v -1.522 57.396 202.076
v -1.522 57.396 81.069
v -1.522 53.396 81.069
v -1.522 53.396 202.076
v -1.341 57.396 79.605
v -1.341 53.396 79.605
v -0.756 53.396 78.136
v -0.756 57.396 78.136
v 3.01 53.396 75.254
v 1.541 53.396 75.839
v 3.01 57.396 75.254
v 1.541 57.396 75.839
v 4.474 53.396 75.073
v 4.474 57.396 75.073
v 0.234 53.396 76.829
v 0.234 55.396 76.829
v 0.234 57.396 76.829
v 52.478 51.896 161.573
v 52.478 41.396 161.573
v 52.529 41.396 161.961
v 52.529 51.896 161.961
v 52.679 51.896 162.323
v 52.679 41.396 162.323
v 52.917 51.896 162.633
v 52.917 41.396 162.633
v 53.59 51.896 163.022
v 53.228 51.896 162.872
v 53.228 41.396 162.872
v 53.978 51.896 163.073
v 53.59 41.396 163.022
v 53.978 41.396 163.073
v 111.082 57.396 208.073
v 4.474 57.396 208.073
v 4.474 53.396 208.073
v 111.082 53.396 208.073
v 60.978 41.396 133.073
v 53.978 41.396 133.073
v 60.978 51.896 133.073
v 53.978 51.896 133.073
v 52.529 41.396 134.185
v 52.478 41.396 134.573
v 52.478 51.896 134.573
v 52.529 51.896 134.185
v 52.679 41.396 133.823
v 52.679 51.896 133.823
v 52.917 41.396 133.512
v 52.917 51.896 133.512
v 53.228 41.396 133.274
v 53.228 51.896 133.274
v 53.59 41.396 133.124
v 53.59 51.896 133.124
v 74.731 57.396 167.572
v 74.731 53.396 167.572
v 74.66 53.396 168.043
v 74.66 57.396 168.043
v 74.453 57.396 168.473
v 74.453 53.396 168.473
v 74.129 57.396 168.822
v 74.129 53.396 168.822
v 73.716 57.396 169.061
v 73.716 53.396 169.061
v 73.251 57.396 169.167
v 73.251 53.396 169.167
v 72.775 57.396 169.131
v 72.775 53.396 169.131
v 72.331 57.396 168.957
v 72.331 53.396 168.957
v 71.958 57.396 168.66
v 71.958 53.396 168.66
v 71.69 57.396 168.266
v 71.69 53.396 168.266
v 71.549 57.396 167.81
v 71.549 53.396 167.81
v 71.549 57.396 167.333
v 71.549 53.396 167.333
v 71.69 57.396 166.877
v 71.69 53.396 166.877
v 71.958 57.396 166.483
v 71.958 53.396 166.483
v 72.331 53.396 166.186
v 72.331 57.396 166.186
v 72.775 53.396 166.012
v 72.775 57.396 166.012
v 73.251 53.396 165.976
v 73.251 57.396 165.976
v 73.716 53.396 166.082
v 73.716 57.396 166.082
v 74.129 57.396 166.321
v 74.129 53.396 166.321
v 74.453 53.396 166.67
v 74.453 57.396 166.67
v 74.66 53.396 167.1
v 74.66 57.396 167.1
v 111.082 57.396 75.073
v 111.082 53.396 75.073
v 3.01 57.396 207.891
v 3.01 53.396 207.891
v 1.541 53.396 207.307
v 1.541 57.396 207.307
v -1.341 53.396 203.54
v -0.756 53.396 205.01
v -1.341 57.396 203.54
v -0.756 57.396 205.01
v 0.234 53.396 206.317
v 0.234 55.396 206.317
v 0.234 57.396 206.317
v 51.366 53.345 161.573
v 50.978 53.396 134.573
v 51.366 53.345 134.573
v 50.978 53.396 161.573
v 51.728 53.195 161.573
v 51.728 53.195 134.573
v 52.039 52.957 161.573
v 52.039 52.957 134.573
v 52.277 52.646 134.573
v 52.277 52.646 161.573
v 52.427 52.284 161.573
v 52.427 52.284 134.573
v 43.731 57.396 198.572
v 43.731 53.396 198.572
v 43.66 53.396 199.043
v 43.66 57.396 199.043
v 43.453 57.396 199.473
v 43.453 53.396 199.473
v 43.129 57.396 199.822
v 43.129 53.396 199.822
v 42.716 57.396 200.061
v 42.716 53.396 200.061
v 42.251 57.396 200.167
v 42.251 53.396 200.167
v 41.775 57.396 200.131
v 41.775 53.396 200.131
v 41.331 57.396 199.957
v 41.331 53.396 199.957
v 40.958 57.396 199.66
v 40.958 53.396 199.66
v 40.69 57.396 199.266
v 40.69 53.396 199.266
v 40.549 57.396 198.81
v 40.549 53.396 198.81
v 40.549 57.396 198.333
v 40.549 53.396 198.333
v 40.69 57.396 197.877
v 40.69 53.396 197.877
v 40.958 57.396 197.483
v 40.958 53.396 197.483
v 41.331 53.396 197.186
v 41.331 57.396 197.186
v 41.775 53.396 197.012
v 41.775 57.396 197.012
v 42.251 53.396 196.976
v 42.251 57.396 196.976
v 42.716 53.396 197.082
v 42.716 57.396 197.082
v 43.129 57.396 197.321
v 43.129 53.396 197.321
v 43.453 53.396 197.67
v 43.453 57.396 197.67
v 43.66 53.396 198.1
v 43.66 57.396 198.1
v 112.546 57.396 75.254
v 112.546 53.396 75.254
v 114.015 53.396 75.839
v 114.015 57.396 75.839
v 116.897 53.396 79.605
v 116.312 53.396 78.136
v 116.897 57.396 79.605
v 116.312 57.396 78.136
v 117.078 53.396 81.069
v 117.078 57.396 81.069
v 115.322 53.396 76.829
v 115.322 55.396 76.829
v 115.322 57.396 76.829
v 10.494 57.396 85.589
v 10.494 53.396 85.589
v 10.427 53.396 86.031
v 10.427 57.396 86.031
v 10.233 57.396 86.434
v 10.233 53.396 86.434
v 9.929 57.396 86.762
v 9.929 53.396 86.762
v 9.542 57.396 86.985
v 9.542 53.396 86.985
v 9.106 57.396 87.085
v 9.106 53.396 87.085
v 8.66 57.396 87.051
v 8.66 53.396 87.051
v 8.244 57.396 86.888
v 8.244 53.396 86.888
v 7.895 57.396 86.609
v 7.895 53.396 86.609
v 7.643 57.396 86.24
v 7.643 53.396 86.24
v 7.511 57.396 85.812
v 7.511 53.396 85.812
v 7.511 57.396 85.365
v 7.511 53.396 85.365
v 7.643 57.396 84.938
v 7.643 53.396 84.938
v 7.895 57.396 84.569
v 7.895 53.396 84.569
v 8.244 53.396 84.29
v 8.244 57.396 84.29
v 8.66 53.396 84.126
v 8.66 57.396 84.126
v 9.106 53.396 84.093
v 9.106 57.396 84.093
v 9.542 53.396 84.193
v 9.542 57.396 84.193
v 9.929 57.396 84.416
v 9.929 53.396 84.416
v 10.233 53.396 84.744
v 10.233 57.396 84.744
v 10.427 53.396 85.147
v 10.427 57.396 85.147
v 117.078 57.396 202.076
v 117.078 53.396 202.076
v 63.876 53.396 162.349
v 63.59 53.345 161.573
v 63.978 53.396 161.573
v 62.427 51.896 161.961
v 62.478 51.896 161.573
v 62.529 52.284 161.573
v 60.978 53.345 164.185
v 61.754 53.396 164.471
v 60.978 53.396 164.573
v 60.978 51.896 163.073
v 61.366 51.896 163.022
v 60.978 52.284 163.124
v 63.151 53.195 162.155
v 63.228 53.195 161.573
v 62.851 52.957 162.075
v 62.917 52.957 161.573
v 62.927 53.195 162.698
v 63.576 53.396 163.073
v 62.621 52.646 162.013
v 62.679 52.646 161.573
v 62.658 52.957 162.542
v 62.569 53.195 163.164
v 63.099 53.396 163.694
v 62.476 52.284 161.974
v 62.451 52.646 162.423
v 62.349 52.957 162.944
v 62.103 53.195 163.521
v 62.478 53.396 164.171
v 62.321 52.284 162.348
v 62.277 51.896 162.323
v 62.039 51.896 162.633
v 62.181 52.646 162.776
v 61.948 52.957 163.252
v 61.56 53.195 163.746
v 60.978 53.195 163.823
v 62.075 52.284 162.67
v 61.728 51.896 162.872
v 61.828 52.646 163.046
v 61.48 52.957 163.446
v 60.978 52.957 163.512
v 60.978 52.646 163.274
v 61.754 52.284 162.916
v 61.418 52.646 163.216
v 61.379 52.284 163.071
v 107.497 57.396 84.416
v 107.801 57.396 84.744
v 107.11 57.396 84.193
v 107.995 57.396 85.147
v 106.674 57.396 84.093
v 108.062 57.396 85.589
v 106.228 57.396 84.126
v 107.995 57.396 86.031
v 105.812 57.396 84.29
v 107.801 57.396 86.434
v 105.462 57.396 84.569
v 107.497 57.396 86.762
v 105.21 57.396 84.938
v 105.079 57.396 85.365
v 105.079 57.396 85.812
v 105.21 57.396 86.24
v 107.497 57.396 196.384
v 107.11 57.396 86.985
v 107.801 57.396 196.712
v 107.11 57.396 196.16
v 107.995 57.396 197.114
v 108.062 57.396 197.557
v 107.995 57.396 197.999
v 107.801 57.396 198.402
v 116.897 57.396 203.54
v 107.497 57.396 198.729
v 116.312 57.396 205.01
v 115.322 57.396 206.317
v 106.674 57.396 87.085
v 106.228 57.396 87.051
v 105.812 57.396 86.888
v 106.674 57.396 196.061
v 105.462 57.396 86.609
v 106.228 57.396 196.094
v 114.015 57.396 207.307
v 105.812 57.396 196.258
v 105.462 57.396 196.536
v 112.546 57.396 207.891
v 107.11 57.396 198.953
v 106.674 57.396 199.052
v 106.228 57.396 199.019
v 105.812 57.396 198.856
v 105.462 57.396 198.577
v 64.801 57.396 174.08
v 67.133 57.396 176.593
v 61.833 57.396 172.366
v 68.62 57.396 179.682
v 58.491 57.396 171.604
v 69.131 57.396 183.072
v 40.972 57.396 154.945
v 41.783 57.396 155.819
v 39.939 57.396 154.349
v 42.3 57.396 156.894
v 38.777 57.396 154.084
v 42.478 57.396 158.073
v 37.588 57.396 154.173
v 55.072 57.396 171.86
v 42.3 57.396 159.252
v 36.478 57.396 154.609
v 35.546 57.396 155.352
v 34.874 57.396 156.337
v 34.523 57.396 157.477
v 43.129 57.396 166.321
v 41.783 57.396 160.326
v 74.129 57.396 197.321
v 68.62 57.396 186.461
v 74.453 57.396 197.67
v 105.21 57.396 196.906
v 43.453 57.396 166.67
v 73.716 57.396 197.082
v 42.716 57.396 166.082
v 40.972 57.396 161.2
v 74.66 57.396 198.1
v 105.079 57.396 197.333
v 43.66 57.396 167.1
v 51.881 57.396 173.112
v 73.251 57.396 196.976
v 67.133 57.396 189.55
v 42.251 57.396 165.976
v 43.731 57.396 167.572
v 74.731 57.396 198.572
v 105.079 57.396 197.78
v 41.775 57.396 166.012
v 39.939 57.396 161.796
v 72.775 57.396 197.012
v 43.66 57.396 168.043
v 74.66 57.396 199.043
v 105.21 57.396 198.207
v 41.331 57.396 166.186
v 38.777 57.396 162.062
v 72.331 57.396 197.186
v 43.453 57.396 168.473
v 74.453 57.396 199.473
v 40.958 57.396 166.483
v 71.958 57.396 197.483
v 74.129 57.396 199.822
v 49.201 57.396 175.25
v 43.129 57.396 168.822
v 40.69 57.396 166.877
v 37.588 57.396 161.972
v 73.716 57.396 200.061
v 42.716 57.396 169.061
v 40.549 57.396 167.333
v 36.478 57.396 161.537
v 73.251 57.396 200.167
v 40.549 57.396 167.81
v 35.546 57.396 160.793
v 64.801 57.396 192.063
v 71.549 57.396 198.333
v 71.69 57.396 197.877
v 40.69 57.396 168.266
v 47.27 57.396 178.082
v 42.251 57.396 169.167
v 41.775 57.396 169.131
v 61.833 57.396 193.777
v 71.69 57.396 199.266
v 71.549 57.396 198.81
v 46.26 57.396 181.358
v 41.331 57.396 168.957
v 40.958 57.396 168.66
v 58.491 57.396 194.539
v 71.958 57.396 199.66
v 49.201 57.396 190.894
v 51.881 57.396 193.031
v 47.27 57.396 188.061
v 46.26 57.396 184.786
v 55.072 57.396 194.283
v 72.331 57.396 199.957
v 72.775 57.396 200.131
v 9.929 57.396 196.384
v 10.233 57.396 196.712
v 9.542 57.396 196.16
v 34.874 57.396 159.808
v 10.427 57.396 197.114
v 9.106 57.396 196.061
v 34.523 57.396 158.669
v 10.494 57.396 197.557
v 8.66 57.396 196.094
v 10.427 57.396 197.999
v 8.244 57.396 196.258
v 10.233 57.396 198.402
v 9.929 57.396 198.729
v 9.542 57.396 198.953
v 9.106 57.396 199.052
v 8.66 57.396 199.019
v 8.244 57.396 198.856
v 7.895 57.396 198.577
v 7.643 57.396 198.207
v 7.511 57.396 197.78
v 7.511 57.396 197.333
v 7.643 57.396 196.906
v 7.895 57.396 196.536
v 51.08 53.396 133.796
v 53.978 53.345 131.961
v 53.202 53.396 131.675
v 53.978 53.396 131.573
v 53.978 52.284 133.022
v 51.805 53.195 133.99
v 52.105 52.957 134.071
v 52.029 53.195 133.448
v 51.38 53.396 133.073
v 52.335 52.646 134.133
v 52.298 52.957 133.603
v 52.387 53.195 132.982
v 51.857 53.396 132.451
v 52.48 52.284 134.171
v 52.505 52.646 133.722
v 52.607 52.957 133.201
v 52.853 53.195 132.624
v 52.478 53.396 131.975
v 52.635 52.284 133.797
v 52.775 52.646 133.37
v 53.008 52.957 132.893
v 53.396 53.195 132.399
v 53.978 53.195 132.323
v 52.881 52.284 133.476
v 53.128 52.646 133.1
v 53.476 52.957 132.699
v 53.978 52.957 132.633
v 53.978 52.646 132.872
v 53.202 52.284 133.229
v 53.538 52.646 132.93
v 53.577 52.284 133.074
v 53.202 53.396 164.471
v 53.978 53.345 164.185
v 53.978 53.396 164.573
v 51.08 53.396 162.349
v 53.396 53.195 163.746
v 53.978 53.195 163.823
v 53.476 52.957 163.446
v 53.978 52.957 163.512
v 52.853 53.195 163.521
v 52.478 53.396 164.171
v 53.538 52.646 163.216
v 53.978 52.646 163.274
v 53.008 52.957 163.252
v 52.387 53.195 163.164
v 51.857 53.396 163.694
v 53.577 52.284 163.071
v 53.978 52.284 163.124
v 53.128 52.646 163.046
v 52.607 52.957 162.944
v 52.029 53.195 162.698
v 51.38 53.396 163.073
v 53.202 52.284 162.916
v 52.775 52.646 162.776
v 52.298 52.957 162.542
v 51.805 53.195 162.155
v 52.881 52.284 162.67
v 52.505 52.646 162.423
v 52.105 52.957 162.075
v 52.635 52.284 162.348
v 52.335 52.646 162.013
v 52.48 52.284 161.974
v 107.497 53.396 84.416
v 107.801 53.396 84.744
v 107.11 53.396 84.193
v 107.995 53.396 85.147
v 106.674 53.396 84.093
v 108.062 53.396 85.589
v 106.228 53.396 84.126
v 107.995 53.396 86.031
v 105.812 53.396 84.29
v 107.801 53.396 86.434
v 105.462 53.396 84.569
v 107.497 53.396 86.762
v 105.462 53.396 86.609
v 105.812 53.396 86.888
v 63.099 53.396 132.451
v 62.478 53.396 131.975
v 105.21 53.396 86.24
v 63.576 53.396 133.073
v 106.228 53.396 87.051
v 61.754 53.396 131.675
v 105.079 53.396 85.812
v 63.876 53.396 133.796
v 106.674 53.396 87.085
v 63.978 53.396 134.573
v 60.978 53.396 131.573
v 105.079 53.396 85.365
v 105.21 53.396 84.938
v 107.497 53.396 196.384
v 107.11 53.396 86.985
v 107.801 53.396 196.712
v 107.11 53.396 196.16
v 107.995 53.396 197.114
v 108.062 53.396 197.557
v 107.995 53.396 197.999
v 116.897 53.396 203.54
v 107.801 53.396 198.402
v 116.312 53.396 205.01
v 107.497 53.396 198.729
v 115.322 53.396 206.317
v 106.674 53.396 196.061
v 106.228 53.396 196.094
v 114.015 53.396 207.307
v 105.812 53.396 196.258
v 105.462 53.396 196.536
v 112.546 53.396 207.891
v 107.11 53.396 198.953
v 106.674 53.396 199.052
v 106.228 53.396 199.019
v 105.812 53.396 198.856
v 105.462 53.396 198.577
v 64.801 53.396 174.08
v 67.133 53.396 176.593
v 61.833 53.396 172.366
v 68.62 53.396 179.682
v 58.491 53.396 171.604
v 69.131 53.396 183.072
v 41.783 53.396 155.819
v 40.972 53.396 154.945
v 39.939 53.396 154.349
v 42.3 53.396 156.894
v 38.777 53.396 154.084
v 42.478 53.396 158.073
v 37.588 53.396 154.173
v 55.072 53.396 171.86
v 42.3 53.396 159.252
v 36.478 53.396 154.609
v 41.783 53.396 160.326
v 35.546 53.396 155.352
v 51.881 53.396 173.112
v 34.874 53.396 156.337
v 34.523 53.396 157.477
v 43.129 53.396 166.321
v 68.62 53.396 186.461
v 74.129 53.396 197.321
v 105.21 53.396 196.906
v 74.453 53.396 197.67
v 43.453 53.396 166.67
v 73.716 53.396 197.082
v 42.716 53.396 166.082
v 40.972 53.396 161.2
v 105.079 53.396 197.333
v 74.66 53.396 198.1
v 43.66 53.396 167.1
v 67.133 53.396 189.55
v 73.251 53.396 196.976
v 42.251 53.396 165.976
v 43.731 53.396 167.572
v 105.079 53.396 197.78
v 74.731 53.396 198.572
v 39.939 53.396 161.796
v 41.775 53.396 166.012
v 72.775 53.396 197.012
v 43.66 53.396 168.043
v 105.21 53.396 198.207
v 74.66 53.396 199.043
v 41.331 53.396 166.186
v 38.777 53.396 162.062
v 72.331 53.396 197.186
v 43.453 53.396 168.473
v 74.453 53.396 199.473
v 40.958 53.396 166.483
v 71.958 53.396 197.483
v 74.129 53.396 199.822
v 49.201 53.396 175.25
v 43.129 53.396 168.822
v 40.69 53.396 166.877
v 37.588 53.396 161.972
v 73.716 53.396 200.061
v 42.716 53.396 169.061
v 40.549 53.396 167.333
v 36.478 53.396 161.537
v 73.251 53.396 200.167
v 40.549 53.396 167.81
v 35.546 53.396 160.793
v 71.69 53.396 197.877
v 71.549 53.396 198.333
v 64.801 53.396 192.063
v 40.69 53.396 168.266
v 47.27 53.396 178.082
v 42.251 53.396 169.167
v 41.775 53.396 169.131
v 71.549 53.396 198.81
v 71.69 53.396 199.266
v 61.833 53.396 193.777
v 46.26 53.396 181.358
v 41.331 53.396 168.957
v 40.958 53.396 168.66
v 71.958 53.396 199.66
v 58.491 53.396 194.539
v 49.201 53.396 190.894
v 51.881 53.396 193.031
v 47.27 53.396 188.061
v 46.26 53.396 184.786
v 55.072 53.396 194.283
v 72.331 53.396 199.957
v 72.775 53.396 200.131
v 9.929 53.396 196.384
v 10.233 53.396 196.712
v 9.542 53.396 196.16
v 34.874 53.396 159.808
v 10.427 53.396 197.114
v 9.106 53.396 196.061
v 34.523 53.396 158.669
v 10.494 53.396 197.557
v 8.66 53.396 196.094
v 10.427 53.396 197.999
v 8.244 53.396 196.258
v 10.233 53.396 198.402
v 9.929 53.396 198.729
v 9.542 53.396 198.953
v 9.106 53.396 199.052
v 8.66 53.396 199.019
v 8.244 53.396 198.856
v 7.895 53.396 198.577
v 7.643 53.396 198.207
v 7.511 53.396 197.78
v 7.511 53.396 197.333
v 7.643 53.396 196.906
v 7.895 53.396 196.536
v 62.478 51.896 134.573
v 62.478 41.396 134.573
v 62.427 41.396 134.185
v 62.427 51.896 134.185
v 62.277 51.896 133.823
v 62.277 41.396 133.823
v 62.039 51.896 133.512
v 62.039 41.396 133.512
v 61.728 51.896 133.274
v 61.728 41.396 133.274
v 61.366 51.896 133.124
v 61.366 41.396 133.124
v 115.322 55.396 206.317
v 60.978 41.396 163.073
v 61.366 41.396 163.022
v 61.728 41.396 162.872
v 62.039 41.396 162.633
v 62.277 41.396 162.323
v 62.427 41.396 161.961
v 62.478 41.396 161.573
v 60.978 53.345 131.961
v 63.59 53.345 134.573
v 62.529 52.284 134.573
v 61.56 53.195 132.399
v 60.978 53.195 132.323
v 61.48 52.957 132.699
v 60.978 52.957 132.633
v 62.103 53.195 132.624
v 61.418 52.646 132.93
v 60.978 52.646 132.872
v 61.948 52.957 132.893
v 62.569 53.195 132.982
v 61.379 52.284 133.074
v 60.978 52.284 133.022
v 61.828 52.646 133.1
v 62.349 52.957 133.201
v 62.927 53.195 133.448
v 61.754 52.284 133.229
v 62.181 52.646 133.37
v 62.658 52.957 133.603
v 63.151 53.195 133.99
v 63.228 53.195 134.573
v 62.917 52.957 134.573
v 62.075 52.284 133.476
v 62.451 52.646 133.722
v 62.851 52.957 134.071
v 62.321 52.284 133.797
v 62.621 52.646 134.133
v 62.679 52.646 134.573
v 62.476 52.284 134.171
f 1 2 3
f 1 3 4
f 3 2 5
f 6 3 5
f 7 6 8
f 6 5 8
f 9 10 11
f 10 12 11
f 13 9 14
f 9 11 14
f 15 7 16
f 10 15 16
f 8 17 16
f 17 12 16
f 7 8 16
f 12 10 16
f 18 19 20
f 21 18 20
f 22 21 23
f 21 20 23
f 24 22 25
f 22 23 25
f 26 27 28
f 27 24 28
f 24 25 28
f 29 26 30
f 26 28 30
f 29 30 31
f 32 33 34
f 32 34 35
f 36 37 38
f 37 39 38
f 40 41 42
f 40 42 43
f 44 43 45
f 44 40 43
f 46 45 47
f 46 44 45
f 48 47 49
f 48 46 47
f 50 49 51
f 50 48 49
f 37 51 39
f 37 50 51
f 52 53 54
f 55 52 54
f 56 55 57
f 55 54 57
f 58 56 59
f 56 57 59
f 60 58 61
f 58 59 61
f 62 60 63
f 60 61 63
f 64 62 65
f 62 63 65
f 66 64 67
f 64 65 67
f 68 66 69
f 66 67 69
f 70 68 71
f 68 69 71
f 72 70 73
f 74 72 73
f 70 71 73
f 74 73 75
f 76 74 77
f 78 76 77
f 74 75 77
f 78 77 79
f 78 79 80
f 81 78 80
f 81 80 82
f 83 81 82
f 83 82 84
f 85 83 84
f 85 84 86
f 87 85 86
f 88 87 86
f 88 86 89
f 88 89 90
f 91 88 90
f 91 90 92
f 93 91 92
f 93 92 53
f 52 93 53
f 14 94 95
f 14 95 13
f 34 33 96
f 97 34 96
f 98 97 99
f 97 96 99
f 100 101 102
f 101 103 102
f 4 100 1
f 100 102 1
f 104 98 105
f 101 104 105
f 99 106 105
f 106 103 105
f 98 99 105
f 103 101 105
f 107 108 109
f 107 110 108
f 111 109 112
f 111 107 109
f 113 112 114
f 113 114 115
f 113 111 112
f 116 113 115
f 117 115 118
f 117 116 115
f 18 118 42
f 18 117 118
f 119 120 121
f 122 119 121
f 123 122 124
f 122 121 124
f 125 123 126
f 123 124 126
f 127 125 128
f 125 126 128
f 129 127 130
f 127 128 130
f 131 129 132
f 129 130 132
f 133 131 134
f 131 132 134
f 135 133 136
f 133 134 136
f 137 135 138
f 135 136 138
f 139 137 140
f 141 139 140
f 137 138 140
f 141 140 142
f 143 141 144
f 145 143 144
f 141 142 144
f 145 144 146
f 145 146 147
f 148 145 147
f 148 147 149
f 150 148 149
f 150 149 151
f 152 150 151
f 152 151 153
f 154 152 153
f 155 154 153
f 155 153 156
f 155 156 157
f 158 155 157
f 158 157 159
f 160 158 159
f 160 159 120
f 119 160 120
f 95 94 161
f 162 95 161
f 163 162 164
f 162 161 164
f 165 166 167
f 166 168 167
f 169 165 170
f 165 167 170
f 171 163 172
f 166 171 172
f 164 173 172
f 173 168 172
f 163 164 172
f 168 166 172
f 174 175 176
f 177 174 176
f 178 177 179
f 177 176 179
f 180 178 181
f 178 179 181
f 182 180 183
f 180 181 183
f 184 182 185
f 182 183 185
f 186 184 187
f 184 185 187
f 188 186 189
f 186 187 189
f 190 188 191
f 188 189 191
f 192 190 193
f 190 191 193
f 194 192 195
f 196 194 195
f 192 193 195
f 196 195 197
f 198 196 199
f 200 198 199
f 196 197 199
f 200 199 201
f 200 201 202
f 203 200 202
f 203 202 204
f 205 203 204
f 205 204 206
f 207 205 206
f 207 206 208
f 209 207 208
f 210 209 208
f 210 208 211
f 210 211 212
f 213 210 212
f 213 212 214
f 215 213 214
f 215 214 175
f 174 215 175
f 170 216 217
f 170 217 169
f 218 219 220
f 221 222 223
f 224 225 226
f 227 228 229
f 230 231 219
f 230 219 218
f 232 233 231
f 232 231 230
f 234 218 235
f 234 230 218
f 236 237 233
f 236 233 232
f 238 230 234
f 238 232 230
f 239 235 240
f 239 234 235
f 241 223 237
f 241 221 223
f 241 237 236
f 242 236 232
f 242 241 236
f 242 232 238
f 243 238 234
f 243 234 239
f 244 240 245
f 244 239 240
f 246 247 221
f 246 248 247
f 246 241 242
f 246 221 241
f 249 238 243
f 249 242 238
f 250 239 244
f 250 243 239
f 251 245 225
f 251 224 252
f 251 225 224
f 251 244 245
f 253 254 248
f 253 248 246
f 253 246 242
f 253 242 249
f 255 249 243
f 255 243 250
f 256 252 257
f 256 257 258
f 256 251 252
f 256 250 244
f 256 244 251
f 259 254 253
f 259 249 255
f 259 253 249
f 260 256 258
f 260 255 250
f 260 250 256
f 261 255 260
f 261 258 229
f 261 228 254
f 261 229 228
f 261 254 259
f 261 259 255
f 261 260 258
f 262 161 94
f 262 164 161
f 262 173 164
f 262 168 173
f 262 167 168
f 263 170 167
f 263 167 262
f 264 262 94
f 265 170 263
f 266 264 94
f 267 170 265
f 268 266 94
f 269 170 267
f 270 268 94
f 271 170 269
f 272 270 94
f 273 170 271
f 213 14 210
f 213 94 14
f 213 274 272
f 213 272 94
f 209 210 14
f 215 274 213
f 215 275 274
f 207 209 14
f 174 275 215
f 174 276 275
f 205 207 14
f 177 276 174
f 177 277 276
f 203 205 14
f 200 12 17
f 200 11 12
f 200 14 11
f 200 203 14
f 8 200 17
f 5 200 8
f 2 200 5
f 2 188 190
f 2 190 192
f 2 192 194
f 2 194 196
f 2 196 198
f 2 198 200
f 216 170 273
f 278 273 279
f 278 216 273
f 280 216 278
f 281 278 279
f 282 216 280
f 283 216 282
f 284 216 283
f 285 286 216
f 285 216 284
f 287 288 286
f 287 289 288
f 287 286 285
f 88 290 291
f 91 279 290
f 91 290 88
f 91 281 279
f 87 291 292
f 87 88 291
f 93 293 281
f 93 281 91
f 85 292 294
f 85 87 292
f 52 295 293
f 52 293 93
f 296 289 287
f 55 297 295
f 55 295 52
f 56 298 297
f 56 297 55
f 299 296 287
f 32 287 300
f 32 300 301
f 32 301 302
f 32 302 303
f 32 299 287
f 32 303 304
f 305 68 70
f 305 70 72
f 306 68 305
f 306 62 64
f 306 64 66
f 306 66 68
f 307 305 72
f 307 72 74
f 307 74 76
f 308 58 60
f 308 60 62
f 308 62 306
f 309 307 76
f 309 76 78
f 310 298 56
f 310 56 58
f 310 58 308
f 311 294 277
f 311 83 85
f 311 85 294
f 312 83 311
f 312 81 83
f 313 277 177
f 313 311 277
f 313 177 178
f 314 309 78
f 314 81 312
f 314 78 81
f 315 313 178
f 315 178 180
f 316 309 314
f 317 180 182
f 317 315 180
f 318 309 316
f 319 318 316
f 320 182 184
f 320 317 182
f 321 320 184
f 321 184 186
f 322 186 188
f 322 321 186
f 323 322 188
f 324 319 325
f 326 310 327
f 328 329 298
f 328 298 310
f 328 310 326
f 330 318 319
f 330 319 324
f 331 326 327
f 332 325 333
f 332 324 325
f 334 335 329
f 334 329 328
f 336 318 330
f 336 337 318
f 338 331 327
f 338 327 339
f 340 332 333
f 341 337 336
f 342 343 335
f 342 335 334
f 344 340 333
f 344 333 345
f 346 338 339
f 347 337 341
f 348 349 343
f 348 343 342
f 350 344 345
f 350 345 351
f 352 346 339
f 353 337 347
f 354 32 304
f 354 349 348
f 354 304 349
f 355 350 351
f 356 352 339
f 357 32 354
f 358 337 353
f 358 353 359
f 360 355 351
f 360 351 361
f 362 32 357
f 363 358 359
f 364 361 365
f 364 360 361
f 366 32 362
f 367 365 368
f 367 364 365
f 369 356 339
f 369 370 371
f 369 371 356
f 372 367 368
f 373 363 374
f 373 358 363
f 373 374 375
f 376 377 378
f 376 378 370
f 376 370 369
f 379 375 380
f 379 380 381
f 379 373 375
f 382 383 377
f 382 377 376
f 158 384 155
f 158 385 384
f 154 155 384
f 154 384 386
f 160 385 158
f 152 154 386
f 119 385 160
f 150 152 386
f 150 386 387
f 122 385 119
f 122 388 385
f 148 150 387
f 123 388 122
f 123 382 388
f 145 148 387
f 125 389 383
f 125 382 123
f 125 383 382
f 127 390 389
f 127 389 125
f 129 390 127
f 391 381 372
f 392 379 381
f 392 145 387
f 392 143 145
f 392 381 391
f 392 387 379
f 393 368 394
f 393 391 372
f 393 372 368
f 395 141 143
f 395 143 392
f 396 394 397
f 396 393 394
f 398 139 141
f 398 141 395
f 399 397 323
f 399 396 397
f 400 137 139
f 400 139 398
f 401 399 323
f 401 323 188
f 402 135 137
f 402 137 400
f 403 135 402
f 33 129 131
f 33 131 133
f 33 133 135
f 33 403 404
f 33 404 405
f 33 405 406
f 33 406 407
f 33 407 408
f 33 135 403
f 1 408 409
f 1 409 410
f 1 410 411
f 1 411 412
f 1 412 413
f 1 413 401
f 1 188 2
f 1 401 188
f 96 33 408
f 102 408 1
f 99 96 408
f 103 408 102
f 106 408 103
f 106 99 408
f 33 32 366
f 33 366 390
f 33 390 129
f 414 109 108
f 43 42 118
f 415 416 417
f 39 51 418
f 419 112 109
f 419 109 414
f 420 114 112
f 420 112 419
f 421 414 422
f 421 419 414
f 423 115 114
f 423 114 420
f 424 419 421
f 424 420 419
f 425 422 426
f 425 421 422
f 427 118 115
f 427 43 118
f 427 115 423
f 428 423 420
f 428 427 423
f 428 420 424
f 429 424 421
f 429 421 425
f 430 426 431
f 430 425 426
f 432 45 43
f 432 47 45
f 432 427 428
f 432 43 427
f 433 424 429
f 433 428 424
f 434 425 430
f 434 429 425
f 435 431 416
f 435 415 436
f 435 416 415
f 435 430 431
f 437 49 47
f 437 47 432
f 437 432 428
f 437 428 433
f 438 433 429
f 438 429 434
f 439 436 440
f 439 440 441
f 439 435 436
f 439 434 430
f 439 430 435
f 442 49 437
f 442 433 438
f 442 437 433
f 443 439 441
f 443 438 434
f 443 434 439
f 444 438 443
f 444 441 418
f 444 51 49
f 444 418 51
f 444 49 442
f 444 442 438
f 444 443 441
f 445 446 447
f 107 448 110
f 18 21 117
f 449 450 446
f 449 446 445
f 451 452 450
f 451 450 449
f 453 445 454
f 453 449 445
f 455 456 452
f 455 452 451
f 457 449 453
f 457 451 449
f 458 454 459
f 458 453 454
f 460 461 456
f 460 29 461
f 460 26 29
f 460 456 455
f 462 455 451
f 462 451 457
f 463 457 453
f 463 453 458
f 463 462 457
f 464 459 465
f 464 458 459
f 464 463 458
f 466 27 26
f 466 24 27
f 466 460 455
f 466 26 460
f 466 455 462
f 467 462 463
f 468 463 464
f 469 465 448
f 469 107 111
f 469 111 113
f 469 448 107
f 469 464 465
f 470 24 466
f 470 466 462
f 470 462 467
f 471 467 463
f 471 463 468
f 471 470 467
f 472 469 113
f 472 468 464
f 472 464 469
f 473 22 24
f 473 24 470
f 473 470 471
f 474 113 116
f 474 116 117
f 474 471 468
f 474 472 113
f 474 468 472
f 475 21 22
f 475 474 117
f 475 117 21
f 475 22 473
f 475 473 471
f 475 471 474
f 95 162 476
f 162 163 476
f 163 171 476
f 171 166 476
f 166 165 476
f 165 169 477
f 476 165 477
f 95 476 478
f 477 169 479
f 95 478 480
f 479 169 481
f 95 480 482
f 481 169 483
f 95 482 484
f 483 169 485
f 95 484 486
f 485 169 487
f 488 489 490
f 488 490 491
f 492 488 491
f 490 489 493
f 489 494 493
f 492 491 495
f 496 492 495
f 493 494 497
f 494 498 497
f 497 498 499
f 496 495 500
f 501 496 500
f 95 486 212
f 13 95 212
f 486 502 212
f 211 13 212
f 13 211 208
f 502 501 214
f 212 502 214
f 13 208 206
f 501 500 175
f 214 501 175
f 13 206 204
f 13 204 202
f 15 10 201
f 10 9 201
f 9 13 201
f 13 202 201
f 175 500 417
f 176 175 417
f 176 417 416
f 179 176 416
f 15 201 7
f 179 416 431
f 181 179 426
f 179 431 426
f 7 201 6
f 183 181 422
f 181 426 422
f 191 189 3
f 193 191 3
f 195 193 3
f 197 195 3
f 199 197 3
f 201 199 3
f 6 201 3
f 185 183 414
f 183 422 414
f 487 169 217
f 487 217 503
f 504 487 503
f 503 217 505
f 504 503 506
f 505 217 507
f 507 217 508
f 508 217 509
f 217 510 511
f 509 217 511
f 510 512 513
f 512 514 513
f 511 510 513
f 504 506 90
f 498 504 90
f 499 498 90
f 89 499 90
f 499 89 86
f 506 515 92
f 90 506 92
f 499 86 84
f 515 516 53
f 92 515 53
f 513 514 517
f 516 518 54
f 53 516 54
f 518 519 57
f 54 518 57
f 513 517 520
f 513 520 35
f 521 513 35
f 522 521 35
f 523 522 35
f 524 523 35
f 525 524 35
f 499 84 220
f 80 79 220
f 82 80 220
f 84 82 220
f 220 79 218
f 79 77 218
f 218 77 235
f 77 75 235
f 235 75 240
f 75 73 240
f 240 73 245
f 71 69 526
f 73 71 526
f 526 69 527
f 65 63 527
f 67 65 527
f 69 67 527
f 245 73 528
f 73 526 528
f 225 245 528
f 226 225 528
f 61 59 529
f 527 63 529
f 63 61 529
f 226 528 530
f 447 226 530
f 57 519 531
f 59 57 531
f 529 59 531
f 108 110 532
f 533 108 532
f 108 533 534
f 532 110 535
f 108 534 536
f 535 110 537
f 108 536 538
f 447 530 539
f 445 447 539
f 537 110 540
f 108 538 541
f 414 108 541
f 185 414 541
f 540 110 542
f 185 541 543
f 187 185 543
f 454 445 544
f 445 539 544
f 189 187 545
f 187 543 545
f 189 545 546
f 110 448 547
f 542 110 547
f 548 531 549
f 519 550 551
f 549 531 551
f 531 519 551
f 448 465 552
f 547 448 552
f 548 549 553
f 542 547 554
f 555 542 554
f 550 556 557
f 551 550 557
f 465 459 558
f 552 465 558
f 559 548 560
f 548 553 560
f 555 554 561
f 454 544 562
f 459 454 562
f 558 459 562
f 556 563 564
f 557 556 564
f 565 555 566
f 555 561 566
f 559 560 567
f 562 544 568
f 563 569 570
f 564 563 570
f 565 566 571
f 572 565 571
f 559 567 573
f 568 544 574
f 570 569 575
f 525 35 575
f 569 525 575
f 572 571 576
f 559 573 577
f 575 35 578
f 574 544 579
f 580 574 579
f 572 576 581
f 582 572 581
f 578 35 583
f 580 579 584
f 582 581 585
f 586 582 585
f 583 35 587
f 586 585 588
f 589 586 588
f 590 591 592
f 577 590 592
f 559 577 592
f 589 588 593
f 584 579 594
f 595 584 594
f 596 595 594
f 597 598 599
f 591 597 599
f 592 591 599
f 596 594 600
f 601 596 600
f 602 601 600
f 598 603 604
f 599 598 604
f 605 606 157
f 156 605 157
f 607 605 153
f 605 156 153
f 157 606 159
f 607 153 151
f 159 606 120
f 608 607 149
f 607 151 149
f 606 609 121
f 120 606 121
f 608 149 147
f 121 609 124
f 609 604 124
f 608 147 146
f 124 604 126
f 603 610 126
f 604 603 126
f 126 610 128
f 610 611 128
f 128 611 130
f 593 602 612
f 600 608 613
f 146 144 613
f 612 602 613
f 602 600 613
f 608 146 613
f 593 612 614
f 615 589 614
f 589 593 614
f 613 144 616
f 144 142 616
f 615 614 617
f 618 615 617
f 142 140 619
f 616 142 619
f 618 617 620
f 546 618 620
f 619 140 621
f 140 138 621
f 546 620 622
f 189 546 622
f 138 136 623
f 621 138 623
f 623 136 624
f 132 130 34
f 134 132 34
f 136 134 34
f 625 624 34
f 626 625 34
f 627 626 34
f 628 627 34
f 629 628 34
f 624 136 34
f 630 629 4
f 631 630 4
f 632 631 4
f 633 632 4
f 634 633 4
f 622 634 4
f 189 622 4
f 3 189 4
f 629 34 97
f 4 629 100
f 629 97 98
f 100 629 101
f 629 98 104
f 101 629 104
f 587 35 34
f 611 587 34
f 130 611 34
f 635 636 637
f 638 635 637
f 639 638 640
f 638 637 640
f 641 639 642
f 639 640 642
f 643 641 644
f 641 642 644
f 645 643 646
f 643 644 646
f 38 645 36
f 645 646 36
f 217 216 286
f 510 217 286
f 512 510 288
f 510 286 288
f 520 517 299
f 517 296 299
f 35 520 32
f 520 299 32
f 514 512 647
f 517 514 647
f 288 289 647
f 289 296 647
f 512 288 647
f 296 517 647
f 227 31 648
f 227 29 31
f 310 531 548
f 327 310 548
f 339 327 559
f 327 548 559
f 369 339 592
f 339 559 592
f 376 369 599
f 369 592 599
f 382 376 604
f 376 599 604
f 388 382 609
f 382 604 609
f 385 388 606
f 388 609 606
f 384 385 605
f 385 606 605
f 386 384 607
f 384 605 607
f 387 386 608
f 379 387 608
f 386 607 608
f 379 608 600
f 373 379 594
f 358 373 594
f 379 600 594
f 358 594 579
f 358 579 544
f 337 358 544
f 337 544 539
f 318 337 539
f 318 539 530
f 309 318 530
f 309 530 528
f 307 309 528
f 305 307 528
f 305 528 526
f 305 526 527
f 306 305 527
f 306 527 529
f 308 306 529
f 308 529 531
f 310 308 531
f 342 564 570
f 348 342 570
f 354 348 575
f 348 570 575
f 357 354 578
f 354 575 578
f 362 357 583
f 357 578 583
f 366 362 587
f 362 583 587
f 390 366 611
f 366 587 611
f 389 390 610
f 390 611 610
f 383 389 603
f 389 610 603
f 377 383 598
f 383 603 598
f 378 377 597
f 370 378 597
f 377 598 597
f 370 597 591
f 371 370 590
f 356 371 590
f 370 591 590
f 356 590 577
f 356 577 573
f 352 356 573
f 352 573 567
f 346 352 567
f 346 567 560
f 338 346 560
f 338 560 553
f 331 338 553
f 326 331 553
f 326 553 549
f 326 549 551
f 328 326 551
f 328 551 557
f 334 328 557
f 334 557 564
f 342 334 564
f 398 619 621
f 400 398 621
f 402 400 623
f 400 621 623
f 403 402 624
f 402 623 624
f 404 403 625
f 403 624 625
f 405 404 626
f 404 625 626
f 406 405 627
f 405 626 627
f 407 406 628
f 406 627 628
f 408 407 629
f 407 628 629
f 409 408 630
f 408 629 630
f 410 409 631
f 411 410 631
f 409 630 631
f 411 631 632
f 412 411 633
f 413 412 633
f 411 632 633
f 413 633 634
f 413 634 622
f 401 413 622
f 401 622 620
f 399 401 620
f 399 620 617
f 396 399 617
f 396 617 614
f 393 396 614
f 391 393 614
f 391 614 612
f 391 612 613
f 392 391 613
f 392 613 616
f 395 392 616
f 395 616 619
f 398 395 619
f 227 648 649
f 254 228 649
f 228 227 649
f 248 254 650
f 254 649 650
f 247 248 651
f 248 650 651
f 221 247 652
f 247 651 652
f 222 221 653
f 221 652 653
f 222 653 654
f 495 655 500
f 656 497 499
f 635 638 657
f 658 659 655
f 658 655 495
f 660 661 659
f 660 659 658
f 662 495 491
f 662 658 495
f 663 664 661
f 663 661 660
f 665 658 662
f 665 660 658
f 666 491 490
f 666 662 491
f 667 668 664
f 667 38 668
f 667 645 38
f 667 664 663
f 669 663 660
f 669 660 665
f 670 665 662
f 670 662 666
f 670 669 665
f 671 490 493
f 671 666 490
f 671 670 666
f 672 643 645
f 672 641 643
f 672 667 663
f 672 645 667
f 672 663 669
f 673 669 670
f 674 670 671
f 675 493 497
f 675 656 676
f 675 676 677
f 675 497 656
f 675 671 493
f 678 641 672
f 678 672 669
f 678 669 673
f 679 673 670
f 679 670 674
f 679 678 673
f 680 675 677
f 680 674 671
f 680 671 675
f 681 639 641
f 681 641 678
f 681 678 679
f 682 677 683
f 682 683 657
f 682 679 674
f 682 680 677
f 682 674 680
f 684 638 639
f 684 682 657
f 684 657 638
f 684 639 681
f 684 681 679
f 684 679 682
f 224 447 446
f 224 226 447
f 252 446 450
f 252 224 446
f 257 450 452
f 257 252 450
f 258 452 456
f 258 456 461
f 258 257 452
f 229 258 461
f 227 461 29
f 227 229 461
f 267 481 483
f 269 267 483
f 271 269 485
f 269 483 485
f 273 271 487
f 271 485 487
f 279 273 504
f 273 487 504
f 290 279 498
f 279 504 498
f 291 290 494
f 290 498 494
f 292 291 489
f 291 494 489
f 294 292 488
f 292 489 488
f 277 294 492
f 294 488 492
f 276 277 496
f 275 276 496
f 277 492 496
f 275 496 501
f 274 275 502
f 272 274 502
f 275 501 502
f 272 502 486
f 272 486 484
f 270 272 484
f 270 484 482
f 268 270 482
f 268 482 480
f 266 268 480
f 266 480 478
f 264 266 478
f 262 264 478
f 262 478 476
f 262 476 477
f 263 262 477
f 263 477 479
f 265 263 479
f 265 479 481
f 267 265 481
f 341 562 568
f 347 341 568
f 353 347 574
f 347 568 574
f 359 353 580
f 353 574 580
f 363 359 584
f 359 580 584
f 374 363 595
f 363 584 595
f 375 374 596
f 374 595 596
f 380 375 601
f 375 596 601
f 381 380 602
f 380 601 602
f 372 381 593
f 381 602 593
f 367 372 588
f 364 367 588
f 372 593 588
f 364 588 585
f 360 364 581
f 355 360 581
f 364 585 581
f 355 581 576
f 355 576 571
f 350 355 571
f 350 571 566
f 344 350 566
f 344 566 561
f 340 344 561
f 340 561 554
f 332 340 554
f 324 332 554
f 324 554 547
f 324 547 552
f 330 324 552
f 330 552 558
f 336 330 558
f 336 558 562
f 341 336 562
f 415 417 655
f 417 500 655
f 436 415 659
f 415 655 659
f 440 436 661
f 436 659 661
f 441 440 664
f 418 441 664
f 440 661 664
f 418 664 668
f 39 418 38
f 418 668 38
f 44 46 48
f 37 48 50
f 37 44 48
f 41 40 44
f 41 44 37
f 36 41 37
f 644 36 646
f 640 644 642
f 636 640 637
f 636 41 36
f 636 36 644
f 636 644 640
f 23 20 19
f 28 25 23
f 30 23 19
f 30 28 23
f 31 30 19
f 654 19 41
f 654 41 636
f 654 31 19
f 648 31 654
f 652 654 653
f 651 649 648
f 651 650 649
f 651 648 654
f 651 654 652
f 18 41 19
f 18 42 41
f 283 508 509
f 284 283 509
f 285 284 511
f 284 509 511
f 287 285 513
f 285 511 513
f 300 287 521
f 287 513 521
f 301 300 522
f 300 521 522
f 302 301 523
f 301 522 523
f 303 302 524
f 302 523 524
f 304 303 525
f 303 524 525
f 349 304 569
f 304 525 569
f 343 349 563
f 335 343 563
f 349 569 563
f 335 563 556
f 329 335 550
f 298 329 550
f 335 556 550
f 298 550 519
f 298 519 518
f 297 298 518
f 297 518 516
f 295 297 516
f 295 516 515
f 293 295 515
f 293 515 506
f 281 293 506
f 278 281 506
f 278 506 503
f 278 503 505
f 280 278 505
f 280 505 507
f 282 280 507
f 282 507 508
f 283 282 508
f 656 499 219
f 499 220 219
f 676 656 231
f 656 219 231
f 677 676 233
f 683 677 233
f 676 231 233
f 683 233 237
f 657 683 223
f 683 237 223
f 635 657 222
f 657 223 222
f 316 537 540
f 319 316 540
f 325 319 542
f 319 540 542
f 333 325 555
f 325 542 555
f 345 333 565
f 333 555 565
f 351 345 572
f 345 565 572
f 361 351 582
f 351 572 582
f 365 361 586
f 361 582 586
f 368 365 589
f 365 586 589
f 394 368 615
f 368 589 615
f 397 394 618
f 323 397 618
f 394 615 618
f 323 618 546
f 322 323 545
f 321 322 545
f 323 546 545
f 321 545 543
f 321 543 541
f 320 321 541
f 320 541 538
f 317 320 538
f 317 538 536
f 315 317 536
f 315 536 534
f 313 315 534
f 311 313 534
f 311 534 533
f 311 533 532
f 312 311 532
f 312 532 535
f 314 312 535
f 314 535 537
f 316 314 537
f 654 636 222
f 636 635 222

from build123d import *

# Parameters (mm, degrees)
BOSS_EXTRUDE1_DEPTH = 4
CUT_EXTRUDE1_REACH  = 6
SKETCH2_R           = 11.5
SKETCH2_R_2         = 1.6
CUT_EXTRUDE2_REACH  = 6
SKETCH4_R           = 1.5
SKETCH5_W           = 10
SKETCH5_H           = 30
BOSS_EXTRUDE2_DEPTH = 12
FILLET1_R           = 1.5
CUT_EXTRUDE3_REACH  = 6
SKETCH6_R           = 4


with BuildPart() as part:
    # Sketch1 → Boss-Extrude1 (new body)
    with BuildSketch(Plane.XZ.offset(-57.396189287)):
        with BuildLine():
            Line((117.077991716, 202.076411562), (117.077991716, 81.069101486))
            add(Edge.make_bspline(
                [(111.081646754, 75.072756524), (117.077991716, 75.072756524), (117.077991716, 81.069101486)],
                knots=[5.498396131, 5.498396131, 5.498396131, 7.067974483, 7.067974483, 7.067974483], degree=2, weights=[1, 0.707537269, 1]))
            Line((111.081646754, 75.072756524), (4.474336679, 75.072756524))
            add(Edge.make_bspline(
                [(-1.522008284, 81.069101486), (-1.522008284, 75.072756524), (4.474336679, 75.072756524)],
                knots=[5.498396131, 5.498396131, 5.498396131, 7.067974483, 7.067974483, 7.067974483], degree=2, weights=[1, 0.707537269, 1]))
            Line((-1.522008284, 81.069101486), (-1.522008284, 202.076411562))
            add(Edge.make_bspline(
                [(4.474336679, 208.072756524), (-1.522008284, 208.072756524), (-1.522008284, 202.076411562)],
                knots=[5.498396131, 5.498396131, 5.498396131, 7.067974483, 7.067974483, 7.067974483], degree=2, weights=[1, 0.707537269, 1]))
            Line((4.474336679, 208.072756524), (111.081646754, 208.072756524))
            add(Edge.make_bspline(
                [(117.077991716, 202.076411562), (117.077991716, 208.072756524), (111.081646754, 208.072756524)],
                knots=[5.498396131, 5.498396131, 5.498396131, 7.067974483, 7.067974483, 7.067974483], degree=2, weights=[1, 0.707537269, 1]))
        make_face()
    extrude(amount=BOSS_EXTRUDE1_DEPTH)

    # Sketch2 → Cut-Extrude1 (cut, up to next)
    with BuildSketch(Plane.XZ.offset(-53.396189287), mode=Mode.PRIVATE) as cut_extrude1_sk1:
        with Locations((57.631208462, 183.071537466)):
            Circle(SKETCH2_R)
    cut_extrude1_tool1 = extrude(cut_extrude1_sk1.sketch, amount=-CUT_EXTRUDE1_REACH, mode=Mode.PRIVATE) & part.part
    add(cut_extrude1_tool1.solids().sort_by_distance((57.631208, 53.396189, 183.071537))[0], mode=Mode.SUBTRACT)
    # Sketch2 → Cut-Extrude1 (cut, up to next)
    with BuildSketch(Plane.XZ.offset(-53.396189287), mode=Mode.PRIVATE) as cut_extrude1_sk2:
        with Locations((73.131208462, 198.571537436)):
            Circle(SKETCH2_R_2)
    cut_extrude1_tool2 = extrude(cut_extrude1_sk2.sketch, amount=-CUT_EXTRUDE1_REACH, mode=Mode.PRIVATE) & part.part
    add(cut_extrude1_tool2.solids().sort_by_distance((73.131208, 53.396189, 198.571537))[0], mode=Mode.SUBTRACT)
    # Sketch2 → Cut-Extrude1 (cut, up to next)
    with BuildSketch(Plane.XZ.offset(-53.396189287), mode=Mode.PRIVATE) as cut_extrude1_sk3:
        with Locations((42.131208462, 198.571537436)):
            Circle(SKETCH2_R_2)
    cut_extrude1_tool3 = extrude(cut_extrude1_sk3.sketch, amount=-CUT_EXTRUDE1_REACH, mode=Mode.PRIVATE) & part.part
    add(cut_extrude1_tool3.solids().sort_by_distance((42.131208, 53.396189, 198.571537))[0], mode=Mode.SUBTRACT)
    # Sketch2 → Cut-Extrude1 (cut, up to next)
    with BuildSketch(Plane.XZ.offset(-53.396189287), mode=Mode.PRIVATE) as cut_extrude1_sk4:
        with Locations((42.131208462, 167.571537436)):
            Circle(SKETCH2_R_2)
    cut_extrude1_tool4 = extrude(cut_extrude1_sk4.sketch, amount=-CUT_EXTRUDE1_REACH, mode=Mode.PRIVATE) & part.part
    add(cut_extrude1_tool4.solids().sort_by_distance((42.131208, 53.396189, 167.571537))[0], mode=Mode.SUBTRACT)
    # Sketch2 → Cut-Extrude1 (cut, up to next)
    with BuildSketch(Plane.XZ.offset(-53.396189287), mode=Mode.PRIVATE) as cut_extrude1_sk5:
        with Locations((73.131208462, 167.571537436)):
            Circle(SKETCH2_R_2)
    cut_extrude1_tool5 = extrude(cut_extrude1_sk5.sketch, amount=-CUT_EXTRUDE1_REACH, mode=Mode.PRIVATE) & part.part
    add(cut_extrude1_tool5.solids().sort_by_distance((73.131208, 53.396189, 167.571537))[0], mode=Mode.SUBTRACT)

    # Sketch4 → Cut-Extrude2 (cut, up to next)
    with BuildSketch(Plane.XZ.offset(-53.396189287), mode=Mode.PRIVATE) as cut_extrude2_sk1:
        with Locations((8.994115753, 197.556632488)):
            Circle(SKETCH4_R)
    cut_extrude2_tool1 = extrude(cut_extrude2_sk1.sketch, amount=-CUT_EXTRUDE2_REACH, mode=Mode.PRIVATE) & part.part
    add(cut_extrude2_tool1.solids().sort_by_distance((8.994116, 53.396189, 197.556632))[0], mode=Mode.SUBTRACT)
    # Sketch4 → Cut-Extrude2 (cut, up to next)
    with BuildSketch(Plane.XZ.offset(-53.396189287), mode=Mode.PRIVATE) as cut_extrude2_sk2:
        with Locations((106.56186768, 197.556632488)):
            Circle(SKETCH4_R)
    cut_extrude2_tool2 = extrude(cut_extrude2_sk2.sketch, amount=-CUT_EXTRUDE2_REACH, mode=Mode.PRIVATE) & part.part
    add(cut_extrude2_tool2.solids().sort_by_distance((106.561868, 53.396189, 197.556632))[0], mode=Mode.SUBTRACT)
    # Sketch4 → Cut-Extrude2 (cut, up to next)
    with BuildSketch(Plane.XZ.offset(-53.396189287), mode=Mode.PRIVATE) as cut_extrude2_sk3:
        with Locations((8.994115753, 85.588880561)):
            Circle(SKETCH4_R)
    cut_extrude2_tool3 = extrude(cut_extrude2_sk3.sketch, amount=-CUT_EXTRUDE2_REACH, mode=Mode.PRIVATE) & part.part
    add(cut_extrude2_tool3.solids().sort_by_distance((8.994116, 53.396189, 85.588881))[0], mode=Mode.SUBTRACT)
    # Sketch4 → Cut-Extrude2 (cut, up to next)
    with BuildSketch(Plane.XZ.offset(-53.396189287), mode=Mode.PRIVATE) as cut_extrude2_sk4:
        with Locations((106.56186768, 85.588880561)):
            Circle(SKETCH4_R)
    cut_extrude2_tool4 = extrude(cut_extrude2_sk4.sketch, amount=-CUT_EXTRUDE2_REACH, mode=Mode.PRIVATE) & part.part
    add(cut_extrude2_tool4.solids().sort_by_distance((106.561868, 53.396189, 85.588881))[0], mode=Mode.SUBTRACT)

    # Sketch5 → Boss-Extrude2 (add)
    with BuildSketch(Plane.XZ.offset(-53.396189287)):
        with Locations((57.477991716, 148.072756524)):
            Rectangle(SKETCH5_W, SKETCH5_H)
    extrude(amount=BOSS_EXTRUDE2_DEPTH)

    # Fillet1
    fillet1_edges = [part.edges().sort_by_distance(p)[0] for p in [
        (52.477991716, 53.396189287, 148.072756524),
        (52.477991716, 47.396189287, 163.072756524),
        (57.477991716, 53.396189287, 133.072756524),
        (52.477991716, 47.396189287, 133.072756524),
        (62.477991716, 53.396189287, 148.072756524),
        (62.477991716, 47.396189287, 133.072756524),
        (57.477991716, 53.396189287, 163.072756524),
        (62.477991716, 47.396189287, 163.072756524),
    ]]
    fillet(fillet1_edges, radius=FILLET1_R)

    # Sketch6 → Cut-Extrude3 (cut, up to next)
    with BuildSketch(Plane.XZ.offset(-53.396189287), mode=Mode.PRIVATE) as cut_extrude3_sk1:
        with Locations((38.477991716, 158.072756524)):
            Circle(SKETCH6_R)
    cut_extrude3_tool1 = extrude(cut_extrude3_sk1.sketch, amount=-CUT_EXTRUDE3_REACH, mode=Mode.PRIVATE) & part.part
    add(cut_extrude3_tool1.solids().sort_by_distance((38.477992, 53.396189, 158.072757))[0], mode=Mode.SUBTRACT)


solid = part.part
